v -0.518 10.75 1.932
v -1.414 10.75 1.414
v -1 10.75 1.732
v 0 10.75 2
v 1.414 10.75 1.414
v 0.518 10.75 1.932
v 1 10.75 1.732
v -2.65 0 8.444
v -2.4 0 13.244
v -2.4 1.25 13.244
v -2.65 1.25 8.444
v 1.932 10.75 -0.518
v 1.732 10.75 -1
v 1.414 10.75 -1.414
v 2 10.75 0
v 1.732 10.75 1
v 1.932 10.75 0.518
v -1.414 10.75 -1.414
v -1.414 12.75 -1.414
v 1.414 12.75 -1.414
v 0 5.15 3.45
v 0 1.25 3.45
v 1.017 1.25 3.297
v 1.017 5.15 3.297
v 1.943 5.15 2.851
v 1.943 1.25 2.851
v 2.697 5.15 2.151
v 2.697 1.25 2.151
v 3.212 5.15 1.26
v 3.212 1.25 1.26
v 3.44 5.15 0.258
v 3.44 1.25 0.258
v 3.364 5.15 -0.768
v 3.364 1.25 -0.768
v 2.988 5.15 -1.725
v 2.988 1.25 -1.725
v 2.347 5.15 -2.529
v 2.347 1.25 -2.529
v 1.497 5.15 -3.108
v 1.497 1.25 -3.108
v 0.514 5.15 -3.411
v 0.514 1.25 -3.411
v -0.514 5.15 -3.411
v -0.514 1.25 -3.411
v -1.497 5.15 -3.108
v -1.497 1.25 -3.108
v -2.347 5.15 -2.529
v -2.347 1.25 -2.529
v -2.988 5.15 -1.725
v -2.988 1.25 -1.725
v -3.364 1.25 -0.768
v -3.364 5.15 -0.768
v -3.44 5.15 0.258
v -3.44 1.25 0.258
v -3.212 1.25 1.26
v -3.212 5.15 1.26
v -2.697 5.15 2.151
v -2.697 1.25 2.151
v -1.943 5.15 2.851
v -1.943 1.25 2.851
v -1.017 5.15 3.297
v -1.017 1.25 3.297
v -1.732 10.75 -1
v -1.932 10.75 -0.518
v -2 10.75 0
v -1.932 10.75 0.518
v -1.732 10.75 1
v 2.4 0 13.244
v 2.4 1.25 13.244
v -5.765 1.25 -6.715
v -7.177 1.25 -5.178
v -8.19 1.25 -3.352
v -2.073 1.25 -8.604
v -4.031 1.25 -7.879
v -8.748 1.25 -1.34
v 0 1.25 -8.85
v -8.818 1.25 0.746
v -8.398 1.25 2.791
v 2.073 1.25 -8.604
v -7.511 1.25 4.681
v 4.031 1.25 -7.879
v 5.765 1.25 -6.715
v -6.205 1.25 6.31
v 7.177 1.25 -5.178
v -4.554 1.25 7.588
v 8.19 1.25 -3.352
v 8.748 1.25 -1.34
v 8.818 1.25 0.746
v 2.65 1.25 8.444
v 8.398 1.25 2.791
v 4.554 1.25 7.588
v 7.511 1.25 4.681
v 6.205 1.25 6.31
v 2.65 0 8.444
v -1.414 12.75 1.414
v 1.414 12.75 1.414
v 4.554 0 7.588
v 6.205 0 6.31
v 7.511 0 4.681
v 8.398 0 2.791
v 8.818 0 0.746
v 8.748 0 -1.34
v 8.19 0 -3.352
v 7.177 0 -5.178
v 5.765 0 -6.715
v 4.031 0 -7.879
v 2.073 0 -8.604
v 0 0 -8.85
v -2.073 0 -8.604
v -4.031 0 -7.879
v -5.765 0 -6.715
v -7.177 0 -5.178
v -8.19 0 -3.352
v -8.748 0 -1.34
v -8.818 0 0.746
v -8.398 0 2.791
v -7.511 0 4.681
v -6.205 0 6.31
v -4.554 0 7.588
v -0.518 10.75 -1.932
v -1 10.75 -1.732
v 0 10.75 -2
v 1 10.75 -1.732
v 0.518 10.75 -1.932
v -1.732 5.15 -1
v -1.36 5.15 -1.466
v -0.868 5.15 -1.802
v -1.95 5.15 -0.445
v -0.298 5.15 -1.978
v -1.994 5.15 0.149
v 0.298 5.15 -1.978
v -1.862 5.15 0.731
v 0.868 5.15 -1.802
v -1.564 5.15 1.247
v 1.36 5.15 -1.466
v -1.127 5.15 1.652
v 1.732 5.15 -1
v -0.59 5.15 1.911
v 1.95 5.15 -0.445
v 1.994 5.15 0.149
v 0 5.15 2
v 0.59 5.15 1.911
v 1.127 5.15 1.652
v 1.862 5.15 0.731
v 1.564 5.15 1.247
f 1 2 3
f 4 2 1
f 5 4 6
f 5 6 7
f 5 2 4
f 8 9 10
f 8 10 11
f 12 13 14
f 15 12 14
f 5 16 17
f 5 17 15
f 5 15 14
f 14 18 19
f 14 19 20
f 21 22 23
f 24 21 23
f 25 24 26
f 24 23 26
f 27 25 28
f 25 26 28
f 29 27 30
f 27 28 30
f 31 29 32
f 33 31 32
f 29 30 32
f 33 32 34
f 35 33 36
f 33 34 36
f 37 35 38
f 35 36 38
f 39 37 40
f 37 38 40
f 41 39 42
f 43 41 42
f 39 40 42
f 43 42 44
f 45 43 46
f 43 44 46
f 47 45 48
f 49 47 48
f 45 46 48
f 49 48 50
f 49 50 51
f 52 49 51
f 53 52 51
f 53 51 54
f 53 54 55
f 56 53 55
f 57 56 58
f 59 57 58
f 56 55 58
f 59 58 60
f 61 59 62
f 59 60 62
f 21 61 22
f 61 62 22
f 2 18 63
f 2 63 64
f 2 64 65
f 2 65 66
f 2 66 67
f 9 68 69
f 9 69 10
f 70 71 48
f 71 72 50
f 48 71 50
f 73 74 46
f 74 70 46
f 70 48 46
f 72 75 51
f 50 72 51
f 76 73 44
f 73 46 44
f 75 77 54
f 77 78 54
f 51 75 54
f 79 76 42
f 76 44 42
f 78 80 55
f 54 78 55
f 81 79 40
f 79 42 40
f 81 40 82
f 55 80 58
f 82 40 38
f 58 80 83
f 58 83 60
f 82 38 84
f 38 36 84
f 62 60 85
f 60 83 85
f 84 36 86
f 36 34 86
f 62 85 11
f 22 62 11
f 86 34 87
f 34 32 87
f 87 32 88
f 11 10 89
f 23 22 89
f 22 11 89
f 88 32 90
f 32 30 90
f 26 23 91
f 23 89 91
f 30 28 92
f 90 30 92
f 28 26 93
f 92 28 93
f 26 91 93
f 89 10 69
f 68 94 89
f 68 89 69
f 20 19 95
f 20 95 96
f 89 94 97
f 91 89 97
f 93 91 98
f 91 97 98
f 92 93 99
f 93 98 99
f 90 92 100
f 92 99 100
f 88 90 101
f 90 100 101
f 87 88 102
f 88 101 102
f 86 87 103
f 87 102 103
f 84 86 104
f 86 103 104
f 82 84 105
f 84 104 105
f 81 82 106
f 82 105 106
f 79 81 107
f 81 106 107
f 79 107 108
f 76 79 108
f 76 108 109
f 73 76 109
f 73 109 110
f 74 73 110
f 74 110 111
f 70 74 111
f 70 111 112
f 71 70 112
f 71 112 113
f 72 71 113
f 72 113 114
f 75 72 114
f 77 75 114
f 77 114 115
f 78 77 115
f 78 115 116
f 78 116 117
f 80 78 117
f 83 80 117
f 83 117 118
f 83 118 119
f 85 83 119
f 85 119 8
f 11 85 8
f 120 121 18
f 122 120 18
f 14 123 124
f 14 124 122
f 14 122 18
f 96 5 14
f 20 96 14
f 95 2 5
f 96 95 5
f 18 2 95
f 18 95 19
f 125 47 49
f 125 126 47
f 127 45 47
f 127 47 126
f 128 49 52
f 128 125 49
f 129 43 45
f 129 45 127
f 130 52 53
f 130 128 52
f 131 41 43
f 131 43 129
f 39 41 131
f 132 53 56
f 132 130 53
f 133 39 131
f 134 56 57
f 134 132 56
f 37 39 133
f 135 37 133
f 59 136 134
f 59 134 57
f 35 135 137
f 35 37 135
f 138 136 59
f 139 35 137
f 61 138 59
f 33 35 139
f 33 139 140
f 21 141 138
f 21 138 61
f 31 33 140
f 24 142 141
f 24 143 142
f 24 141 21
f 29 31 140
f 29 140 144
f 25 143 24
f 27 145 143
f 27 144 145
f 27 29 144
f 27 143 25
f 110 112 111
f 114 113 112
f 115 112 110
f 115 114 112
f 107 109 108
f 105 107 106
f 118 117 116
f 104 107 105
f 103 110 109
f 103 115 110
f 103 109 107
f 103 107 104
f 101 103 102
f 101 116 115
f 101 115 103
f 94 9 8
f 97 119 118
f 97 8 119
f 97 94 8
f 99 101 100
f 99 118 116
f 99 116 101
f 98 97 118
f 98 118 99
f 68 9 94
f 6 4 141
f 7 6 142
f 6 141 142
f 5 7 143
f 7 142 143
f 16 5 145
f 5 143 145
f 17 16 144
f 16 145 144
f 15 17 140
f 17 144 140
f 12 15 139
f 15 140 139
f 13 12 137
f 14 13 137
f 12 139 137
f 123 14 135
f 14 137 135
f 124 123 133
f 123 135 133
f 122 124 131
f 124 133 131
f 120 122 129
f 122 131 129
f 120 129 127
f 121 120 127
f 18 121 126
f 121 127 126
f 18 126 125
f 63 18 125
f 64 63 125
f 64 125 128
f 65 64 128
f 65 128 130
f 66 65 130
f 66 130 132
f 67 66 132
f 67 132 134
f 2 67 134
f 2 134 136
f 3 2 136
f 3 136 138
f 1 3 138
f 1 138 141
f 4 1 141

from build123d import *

# Parameters (mm, degrees)
SKETCH1_R           = 8.85
BOSS_EXTRUDE1_DEPTH = 1.25
SKETCH2_R           = 3.45
BOSS_EXTRUDE2_DEPTH = 3.9
SKETCH3_R           = 2
BOSS_EXTRUDE3_DEPTH = 5.6
SKETCH4_W           = 2.828427124
SKETCH4_H           = 2.828427124
BOSS_EXTRUDE4_DEPTH = 2
BOSS_EXTRUDE5_DEPTH = 1.25


with BuildPart() as part:
    # Sketch1 → Boss-Extrude1 (new body)
    with BuildSketch(Plane(origin=(0, 0, 0), x_dir=(1, 0, 0), z_dir=(0, 1, 0))):
        with Locations(Location((0, 0, 0), (0, 0, 270))):
            Circle(SKETCH1_R)
    extrude(amount=BOSS_EXTRUDE1_DEPTH)

    # Sketch2 → Boss-Extrude2 (add)
    with BuildSketch(Plane(origin=(0, 1.25, 0), x_dir=(1, 0, 0), z_dir=(0, 1, 0))):
        with Locations(Location((0, 0, 0), (0, 0, 270))):
            Circle(SKETCH2_R)
    extrude(amount=BOSS_EXTRUDE2_DEPTH)

    # Sketch3 → Boss-Extrude3 (add)
    with BuildSketch(Plane(origin=(0, 5.15, 0), x_dir=(1, 0, 0), z_dir=(0, 1, 0))):
        with Locations(Location((0, 0, 0), (0, 0, 270))):
            Circle(SKETCH3_R)
    extrude(amount=BOSS_EXTRUDE3_DEPTH)

    # Sketch4 → Boss-Extrude4 (add)
    with BuildSketch(Plane(origin=(0, 10.75, 0), x_dir=(1, 0, 0), z_dir=(0, 1, 0))):
        Rectangle(SKETCH4_W, SKETCH4_H)
    extrude(amount=BOSS_EXTRUDE4_DEPTH)

    # Sketch5 → Boss-Extrude5 (add)
    with BuildSketch(Plane.XZ):
        with BuildLine():
            ThreePointArc((-2.65, 8.443932733), (-1.340465463, 8.747894166), (0, 8.85))
            Line((0, 8.85), (0, 13.243932733))
            Line((0, 13.243932733), (-2.4, 13.243932733))
            Line((-2.4, 13.243932733), (-2.65, 8.443932733))
        make_face()
        with BuildLine():
            Line((0, 13.243932733), (0, 8.85))
            ThreePointArc((0, 8.85), (1.340465463, 8.747894166), (2.65, 8.443932733))
            Line((2.65, 8.443932733), (2.4, 13.243932733))
            Line((2.4, 13.243932733), (0, 13.243932733))
        make_face()
    extrude(amount=-BOSS_EXTRUDE5_DEPTH)


solid = part.part
